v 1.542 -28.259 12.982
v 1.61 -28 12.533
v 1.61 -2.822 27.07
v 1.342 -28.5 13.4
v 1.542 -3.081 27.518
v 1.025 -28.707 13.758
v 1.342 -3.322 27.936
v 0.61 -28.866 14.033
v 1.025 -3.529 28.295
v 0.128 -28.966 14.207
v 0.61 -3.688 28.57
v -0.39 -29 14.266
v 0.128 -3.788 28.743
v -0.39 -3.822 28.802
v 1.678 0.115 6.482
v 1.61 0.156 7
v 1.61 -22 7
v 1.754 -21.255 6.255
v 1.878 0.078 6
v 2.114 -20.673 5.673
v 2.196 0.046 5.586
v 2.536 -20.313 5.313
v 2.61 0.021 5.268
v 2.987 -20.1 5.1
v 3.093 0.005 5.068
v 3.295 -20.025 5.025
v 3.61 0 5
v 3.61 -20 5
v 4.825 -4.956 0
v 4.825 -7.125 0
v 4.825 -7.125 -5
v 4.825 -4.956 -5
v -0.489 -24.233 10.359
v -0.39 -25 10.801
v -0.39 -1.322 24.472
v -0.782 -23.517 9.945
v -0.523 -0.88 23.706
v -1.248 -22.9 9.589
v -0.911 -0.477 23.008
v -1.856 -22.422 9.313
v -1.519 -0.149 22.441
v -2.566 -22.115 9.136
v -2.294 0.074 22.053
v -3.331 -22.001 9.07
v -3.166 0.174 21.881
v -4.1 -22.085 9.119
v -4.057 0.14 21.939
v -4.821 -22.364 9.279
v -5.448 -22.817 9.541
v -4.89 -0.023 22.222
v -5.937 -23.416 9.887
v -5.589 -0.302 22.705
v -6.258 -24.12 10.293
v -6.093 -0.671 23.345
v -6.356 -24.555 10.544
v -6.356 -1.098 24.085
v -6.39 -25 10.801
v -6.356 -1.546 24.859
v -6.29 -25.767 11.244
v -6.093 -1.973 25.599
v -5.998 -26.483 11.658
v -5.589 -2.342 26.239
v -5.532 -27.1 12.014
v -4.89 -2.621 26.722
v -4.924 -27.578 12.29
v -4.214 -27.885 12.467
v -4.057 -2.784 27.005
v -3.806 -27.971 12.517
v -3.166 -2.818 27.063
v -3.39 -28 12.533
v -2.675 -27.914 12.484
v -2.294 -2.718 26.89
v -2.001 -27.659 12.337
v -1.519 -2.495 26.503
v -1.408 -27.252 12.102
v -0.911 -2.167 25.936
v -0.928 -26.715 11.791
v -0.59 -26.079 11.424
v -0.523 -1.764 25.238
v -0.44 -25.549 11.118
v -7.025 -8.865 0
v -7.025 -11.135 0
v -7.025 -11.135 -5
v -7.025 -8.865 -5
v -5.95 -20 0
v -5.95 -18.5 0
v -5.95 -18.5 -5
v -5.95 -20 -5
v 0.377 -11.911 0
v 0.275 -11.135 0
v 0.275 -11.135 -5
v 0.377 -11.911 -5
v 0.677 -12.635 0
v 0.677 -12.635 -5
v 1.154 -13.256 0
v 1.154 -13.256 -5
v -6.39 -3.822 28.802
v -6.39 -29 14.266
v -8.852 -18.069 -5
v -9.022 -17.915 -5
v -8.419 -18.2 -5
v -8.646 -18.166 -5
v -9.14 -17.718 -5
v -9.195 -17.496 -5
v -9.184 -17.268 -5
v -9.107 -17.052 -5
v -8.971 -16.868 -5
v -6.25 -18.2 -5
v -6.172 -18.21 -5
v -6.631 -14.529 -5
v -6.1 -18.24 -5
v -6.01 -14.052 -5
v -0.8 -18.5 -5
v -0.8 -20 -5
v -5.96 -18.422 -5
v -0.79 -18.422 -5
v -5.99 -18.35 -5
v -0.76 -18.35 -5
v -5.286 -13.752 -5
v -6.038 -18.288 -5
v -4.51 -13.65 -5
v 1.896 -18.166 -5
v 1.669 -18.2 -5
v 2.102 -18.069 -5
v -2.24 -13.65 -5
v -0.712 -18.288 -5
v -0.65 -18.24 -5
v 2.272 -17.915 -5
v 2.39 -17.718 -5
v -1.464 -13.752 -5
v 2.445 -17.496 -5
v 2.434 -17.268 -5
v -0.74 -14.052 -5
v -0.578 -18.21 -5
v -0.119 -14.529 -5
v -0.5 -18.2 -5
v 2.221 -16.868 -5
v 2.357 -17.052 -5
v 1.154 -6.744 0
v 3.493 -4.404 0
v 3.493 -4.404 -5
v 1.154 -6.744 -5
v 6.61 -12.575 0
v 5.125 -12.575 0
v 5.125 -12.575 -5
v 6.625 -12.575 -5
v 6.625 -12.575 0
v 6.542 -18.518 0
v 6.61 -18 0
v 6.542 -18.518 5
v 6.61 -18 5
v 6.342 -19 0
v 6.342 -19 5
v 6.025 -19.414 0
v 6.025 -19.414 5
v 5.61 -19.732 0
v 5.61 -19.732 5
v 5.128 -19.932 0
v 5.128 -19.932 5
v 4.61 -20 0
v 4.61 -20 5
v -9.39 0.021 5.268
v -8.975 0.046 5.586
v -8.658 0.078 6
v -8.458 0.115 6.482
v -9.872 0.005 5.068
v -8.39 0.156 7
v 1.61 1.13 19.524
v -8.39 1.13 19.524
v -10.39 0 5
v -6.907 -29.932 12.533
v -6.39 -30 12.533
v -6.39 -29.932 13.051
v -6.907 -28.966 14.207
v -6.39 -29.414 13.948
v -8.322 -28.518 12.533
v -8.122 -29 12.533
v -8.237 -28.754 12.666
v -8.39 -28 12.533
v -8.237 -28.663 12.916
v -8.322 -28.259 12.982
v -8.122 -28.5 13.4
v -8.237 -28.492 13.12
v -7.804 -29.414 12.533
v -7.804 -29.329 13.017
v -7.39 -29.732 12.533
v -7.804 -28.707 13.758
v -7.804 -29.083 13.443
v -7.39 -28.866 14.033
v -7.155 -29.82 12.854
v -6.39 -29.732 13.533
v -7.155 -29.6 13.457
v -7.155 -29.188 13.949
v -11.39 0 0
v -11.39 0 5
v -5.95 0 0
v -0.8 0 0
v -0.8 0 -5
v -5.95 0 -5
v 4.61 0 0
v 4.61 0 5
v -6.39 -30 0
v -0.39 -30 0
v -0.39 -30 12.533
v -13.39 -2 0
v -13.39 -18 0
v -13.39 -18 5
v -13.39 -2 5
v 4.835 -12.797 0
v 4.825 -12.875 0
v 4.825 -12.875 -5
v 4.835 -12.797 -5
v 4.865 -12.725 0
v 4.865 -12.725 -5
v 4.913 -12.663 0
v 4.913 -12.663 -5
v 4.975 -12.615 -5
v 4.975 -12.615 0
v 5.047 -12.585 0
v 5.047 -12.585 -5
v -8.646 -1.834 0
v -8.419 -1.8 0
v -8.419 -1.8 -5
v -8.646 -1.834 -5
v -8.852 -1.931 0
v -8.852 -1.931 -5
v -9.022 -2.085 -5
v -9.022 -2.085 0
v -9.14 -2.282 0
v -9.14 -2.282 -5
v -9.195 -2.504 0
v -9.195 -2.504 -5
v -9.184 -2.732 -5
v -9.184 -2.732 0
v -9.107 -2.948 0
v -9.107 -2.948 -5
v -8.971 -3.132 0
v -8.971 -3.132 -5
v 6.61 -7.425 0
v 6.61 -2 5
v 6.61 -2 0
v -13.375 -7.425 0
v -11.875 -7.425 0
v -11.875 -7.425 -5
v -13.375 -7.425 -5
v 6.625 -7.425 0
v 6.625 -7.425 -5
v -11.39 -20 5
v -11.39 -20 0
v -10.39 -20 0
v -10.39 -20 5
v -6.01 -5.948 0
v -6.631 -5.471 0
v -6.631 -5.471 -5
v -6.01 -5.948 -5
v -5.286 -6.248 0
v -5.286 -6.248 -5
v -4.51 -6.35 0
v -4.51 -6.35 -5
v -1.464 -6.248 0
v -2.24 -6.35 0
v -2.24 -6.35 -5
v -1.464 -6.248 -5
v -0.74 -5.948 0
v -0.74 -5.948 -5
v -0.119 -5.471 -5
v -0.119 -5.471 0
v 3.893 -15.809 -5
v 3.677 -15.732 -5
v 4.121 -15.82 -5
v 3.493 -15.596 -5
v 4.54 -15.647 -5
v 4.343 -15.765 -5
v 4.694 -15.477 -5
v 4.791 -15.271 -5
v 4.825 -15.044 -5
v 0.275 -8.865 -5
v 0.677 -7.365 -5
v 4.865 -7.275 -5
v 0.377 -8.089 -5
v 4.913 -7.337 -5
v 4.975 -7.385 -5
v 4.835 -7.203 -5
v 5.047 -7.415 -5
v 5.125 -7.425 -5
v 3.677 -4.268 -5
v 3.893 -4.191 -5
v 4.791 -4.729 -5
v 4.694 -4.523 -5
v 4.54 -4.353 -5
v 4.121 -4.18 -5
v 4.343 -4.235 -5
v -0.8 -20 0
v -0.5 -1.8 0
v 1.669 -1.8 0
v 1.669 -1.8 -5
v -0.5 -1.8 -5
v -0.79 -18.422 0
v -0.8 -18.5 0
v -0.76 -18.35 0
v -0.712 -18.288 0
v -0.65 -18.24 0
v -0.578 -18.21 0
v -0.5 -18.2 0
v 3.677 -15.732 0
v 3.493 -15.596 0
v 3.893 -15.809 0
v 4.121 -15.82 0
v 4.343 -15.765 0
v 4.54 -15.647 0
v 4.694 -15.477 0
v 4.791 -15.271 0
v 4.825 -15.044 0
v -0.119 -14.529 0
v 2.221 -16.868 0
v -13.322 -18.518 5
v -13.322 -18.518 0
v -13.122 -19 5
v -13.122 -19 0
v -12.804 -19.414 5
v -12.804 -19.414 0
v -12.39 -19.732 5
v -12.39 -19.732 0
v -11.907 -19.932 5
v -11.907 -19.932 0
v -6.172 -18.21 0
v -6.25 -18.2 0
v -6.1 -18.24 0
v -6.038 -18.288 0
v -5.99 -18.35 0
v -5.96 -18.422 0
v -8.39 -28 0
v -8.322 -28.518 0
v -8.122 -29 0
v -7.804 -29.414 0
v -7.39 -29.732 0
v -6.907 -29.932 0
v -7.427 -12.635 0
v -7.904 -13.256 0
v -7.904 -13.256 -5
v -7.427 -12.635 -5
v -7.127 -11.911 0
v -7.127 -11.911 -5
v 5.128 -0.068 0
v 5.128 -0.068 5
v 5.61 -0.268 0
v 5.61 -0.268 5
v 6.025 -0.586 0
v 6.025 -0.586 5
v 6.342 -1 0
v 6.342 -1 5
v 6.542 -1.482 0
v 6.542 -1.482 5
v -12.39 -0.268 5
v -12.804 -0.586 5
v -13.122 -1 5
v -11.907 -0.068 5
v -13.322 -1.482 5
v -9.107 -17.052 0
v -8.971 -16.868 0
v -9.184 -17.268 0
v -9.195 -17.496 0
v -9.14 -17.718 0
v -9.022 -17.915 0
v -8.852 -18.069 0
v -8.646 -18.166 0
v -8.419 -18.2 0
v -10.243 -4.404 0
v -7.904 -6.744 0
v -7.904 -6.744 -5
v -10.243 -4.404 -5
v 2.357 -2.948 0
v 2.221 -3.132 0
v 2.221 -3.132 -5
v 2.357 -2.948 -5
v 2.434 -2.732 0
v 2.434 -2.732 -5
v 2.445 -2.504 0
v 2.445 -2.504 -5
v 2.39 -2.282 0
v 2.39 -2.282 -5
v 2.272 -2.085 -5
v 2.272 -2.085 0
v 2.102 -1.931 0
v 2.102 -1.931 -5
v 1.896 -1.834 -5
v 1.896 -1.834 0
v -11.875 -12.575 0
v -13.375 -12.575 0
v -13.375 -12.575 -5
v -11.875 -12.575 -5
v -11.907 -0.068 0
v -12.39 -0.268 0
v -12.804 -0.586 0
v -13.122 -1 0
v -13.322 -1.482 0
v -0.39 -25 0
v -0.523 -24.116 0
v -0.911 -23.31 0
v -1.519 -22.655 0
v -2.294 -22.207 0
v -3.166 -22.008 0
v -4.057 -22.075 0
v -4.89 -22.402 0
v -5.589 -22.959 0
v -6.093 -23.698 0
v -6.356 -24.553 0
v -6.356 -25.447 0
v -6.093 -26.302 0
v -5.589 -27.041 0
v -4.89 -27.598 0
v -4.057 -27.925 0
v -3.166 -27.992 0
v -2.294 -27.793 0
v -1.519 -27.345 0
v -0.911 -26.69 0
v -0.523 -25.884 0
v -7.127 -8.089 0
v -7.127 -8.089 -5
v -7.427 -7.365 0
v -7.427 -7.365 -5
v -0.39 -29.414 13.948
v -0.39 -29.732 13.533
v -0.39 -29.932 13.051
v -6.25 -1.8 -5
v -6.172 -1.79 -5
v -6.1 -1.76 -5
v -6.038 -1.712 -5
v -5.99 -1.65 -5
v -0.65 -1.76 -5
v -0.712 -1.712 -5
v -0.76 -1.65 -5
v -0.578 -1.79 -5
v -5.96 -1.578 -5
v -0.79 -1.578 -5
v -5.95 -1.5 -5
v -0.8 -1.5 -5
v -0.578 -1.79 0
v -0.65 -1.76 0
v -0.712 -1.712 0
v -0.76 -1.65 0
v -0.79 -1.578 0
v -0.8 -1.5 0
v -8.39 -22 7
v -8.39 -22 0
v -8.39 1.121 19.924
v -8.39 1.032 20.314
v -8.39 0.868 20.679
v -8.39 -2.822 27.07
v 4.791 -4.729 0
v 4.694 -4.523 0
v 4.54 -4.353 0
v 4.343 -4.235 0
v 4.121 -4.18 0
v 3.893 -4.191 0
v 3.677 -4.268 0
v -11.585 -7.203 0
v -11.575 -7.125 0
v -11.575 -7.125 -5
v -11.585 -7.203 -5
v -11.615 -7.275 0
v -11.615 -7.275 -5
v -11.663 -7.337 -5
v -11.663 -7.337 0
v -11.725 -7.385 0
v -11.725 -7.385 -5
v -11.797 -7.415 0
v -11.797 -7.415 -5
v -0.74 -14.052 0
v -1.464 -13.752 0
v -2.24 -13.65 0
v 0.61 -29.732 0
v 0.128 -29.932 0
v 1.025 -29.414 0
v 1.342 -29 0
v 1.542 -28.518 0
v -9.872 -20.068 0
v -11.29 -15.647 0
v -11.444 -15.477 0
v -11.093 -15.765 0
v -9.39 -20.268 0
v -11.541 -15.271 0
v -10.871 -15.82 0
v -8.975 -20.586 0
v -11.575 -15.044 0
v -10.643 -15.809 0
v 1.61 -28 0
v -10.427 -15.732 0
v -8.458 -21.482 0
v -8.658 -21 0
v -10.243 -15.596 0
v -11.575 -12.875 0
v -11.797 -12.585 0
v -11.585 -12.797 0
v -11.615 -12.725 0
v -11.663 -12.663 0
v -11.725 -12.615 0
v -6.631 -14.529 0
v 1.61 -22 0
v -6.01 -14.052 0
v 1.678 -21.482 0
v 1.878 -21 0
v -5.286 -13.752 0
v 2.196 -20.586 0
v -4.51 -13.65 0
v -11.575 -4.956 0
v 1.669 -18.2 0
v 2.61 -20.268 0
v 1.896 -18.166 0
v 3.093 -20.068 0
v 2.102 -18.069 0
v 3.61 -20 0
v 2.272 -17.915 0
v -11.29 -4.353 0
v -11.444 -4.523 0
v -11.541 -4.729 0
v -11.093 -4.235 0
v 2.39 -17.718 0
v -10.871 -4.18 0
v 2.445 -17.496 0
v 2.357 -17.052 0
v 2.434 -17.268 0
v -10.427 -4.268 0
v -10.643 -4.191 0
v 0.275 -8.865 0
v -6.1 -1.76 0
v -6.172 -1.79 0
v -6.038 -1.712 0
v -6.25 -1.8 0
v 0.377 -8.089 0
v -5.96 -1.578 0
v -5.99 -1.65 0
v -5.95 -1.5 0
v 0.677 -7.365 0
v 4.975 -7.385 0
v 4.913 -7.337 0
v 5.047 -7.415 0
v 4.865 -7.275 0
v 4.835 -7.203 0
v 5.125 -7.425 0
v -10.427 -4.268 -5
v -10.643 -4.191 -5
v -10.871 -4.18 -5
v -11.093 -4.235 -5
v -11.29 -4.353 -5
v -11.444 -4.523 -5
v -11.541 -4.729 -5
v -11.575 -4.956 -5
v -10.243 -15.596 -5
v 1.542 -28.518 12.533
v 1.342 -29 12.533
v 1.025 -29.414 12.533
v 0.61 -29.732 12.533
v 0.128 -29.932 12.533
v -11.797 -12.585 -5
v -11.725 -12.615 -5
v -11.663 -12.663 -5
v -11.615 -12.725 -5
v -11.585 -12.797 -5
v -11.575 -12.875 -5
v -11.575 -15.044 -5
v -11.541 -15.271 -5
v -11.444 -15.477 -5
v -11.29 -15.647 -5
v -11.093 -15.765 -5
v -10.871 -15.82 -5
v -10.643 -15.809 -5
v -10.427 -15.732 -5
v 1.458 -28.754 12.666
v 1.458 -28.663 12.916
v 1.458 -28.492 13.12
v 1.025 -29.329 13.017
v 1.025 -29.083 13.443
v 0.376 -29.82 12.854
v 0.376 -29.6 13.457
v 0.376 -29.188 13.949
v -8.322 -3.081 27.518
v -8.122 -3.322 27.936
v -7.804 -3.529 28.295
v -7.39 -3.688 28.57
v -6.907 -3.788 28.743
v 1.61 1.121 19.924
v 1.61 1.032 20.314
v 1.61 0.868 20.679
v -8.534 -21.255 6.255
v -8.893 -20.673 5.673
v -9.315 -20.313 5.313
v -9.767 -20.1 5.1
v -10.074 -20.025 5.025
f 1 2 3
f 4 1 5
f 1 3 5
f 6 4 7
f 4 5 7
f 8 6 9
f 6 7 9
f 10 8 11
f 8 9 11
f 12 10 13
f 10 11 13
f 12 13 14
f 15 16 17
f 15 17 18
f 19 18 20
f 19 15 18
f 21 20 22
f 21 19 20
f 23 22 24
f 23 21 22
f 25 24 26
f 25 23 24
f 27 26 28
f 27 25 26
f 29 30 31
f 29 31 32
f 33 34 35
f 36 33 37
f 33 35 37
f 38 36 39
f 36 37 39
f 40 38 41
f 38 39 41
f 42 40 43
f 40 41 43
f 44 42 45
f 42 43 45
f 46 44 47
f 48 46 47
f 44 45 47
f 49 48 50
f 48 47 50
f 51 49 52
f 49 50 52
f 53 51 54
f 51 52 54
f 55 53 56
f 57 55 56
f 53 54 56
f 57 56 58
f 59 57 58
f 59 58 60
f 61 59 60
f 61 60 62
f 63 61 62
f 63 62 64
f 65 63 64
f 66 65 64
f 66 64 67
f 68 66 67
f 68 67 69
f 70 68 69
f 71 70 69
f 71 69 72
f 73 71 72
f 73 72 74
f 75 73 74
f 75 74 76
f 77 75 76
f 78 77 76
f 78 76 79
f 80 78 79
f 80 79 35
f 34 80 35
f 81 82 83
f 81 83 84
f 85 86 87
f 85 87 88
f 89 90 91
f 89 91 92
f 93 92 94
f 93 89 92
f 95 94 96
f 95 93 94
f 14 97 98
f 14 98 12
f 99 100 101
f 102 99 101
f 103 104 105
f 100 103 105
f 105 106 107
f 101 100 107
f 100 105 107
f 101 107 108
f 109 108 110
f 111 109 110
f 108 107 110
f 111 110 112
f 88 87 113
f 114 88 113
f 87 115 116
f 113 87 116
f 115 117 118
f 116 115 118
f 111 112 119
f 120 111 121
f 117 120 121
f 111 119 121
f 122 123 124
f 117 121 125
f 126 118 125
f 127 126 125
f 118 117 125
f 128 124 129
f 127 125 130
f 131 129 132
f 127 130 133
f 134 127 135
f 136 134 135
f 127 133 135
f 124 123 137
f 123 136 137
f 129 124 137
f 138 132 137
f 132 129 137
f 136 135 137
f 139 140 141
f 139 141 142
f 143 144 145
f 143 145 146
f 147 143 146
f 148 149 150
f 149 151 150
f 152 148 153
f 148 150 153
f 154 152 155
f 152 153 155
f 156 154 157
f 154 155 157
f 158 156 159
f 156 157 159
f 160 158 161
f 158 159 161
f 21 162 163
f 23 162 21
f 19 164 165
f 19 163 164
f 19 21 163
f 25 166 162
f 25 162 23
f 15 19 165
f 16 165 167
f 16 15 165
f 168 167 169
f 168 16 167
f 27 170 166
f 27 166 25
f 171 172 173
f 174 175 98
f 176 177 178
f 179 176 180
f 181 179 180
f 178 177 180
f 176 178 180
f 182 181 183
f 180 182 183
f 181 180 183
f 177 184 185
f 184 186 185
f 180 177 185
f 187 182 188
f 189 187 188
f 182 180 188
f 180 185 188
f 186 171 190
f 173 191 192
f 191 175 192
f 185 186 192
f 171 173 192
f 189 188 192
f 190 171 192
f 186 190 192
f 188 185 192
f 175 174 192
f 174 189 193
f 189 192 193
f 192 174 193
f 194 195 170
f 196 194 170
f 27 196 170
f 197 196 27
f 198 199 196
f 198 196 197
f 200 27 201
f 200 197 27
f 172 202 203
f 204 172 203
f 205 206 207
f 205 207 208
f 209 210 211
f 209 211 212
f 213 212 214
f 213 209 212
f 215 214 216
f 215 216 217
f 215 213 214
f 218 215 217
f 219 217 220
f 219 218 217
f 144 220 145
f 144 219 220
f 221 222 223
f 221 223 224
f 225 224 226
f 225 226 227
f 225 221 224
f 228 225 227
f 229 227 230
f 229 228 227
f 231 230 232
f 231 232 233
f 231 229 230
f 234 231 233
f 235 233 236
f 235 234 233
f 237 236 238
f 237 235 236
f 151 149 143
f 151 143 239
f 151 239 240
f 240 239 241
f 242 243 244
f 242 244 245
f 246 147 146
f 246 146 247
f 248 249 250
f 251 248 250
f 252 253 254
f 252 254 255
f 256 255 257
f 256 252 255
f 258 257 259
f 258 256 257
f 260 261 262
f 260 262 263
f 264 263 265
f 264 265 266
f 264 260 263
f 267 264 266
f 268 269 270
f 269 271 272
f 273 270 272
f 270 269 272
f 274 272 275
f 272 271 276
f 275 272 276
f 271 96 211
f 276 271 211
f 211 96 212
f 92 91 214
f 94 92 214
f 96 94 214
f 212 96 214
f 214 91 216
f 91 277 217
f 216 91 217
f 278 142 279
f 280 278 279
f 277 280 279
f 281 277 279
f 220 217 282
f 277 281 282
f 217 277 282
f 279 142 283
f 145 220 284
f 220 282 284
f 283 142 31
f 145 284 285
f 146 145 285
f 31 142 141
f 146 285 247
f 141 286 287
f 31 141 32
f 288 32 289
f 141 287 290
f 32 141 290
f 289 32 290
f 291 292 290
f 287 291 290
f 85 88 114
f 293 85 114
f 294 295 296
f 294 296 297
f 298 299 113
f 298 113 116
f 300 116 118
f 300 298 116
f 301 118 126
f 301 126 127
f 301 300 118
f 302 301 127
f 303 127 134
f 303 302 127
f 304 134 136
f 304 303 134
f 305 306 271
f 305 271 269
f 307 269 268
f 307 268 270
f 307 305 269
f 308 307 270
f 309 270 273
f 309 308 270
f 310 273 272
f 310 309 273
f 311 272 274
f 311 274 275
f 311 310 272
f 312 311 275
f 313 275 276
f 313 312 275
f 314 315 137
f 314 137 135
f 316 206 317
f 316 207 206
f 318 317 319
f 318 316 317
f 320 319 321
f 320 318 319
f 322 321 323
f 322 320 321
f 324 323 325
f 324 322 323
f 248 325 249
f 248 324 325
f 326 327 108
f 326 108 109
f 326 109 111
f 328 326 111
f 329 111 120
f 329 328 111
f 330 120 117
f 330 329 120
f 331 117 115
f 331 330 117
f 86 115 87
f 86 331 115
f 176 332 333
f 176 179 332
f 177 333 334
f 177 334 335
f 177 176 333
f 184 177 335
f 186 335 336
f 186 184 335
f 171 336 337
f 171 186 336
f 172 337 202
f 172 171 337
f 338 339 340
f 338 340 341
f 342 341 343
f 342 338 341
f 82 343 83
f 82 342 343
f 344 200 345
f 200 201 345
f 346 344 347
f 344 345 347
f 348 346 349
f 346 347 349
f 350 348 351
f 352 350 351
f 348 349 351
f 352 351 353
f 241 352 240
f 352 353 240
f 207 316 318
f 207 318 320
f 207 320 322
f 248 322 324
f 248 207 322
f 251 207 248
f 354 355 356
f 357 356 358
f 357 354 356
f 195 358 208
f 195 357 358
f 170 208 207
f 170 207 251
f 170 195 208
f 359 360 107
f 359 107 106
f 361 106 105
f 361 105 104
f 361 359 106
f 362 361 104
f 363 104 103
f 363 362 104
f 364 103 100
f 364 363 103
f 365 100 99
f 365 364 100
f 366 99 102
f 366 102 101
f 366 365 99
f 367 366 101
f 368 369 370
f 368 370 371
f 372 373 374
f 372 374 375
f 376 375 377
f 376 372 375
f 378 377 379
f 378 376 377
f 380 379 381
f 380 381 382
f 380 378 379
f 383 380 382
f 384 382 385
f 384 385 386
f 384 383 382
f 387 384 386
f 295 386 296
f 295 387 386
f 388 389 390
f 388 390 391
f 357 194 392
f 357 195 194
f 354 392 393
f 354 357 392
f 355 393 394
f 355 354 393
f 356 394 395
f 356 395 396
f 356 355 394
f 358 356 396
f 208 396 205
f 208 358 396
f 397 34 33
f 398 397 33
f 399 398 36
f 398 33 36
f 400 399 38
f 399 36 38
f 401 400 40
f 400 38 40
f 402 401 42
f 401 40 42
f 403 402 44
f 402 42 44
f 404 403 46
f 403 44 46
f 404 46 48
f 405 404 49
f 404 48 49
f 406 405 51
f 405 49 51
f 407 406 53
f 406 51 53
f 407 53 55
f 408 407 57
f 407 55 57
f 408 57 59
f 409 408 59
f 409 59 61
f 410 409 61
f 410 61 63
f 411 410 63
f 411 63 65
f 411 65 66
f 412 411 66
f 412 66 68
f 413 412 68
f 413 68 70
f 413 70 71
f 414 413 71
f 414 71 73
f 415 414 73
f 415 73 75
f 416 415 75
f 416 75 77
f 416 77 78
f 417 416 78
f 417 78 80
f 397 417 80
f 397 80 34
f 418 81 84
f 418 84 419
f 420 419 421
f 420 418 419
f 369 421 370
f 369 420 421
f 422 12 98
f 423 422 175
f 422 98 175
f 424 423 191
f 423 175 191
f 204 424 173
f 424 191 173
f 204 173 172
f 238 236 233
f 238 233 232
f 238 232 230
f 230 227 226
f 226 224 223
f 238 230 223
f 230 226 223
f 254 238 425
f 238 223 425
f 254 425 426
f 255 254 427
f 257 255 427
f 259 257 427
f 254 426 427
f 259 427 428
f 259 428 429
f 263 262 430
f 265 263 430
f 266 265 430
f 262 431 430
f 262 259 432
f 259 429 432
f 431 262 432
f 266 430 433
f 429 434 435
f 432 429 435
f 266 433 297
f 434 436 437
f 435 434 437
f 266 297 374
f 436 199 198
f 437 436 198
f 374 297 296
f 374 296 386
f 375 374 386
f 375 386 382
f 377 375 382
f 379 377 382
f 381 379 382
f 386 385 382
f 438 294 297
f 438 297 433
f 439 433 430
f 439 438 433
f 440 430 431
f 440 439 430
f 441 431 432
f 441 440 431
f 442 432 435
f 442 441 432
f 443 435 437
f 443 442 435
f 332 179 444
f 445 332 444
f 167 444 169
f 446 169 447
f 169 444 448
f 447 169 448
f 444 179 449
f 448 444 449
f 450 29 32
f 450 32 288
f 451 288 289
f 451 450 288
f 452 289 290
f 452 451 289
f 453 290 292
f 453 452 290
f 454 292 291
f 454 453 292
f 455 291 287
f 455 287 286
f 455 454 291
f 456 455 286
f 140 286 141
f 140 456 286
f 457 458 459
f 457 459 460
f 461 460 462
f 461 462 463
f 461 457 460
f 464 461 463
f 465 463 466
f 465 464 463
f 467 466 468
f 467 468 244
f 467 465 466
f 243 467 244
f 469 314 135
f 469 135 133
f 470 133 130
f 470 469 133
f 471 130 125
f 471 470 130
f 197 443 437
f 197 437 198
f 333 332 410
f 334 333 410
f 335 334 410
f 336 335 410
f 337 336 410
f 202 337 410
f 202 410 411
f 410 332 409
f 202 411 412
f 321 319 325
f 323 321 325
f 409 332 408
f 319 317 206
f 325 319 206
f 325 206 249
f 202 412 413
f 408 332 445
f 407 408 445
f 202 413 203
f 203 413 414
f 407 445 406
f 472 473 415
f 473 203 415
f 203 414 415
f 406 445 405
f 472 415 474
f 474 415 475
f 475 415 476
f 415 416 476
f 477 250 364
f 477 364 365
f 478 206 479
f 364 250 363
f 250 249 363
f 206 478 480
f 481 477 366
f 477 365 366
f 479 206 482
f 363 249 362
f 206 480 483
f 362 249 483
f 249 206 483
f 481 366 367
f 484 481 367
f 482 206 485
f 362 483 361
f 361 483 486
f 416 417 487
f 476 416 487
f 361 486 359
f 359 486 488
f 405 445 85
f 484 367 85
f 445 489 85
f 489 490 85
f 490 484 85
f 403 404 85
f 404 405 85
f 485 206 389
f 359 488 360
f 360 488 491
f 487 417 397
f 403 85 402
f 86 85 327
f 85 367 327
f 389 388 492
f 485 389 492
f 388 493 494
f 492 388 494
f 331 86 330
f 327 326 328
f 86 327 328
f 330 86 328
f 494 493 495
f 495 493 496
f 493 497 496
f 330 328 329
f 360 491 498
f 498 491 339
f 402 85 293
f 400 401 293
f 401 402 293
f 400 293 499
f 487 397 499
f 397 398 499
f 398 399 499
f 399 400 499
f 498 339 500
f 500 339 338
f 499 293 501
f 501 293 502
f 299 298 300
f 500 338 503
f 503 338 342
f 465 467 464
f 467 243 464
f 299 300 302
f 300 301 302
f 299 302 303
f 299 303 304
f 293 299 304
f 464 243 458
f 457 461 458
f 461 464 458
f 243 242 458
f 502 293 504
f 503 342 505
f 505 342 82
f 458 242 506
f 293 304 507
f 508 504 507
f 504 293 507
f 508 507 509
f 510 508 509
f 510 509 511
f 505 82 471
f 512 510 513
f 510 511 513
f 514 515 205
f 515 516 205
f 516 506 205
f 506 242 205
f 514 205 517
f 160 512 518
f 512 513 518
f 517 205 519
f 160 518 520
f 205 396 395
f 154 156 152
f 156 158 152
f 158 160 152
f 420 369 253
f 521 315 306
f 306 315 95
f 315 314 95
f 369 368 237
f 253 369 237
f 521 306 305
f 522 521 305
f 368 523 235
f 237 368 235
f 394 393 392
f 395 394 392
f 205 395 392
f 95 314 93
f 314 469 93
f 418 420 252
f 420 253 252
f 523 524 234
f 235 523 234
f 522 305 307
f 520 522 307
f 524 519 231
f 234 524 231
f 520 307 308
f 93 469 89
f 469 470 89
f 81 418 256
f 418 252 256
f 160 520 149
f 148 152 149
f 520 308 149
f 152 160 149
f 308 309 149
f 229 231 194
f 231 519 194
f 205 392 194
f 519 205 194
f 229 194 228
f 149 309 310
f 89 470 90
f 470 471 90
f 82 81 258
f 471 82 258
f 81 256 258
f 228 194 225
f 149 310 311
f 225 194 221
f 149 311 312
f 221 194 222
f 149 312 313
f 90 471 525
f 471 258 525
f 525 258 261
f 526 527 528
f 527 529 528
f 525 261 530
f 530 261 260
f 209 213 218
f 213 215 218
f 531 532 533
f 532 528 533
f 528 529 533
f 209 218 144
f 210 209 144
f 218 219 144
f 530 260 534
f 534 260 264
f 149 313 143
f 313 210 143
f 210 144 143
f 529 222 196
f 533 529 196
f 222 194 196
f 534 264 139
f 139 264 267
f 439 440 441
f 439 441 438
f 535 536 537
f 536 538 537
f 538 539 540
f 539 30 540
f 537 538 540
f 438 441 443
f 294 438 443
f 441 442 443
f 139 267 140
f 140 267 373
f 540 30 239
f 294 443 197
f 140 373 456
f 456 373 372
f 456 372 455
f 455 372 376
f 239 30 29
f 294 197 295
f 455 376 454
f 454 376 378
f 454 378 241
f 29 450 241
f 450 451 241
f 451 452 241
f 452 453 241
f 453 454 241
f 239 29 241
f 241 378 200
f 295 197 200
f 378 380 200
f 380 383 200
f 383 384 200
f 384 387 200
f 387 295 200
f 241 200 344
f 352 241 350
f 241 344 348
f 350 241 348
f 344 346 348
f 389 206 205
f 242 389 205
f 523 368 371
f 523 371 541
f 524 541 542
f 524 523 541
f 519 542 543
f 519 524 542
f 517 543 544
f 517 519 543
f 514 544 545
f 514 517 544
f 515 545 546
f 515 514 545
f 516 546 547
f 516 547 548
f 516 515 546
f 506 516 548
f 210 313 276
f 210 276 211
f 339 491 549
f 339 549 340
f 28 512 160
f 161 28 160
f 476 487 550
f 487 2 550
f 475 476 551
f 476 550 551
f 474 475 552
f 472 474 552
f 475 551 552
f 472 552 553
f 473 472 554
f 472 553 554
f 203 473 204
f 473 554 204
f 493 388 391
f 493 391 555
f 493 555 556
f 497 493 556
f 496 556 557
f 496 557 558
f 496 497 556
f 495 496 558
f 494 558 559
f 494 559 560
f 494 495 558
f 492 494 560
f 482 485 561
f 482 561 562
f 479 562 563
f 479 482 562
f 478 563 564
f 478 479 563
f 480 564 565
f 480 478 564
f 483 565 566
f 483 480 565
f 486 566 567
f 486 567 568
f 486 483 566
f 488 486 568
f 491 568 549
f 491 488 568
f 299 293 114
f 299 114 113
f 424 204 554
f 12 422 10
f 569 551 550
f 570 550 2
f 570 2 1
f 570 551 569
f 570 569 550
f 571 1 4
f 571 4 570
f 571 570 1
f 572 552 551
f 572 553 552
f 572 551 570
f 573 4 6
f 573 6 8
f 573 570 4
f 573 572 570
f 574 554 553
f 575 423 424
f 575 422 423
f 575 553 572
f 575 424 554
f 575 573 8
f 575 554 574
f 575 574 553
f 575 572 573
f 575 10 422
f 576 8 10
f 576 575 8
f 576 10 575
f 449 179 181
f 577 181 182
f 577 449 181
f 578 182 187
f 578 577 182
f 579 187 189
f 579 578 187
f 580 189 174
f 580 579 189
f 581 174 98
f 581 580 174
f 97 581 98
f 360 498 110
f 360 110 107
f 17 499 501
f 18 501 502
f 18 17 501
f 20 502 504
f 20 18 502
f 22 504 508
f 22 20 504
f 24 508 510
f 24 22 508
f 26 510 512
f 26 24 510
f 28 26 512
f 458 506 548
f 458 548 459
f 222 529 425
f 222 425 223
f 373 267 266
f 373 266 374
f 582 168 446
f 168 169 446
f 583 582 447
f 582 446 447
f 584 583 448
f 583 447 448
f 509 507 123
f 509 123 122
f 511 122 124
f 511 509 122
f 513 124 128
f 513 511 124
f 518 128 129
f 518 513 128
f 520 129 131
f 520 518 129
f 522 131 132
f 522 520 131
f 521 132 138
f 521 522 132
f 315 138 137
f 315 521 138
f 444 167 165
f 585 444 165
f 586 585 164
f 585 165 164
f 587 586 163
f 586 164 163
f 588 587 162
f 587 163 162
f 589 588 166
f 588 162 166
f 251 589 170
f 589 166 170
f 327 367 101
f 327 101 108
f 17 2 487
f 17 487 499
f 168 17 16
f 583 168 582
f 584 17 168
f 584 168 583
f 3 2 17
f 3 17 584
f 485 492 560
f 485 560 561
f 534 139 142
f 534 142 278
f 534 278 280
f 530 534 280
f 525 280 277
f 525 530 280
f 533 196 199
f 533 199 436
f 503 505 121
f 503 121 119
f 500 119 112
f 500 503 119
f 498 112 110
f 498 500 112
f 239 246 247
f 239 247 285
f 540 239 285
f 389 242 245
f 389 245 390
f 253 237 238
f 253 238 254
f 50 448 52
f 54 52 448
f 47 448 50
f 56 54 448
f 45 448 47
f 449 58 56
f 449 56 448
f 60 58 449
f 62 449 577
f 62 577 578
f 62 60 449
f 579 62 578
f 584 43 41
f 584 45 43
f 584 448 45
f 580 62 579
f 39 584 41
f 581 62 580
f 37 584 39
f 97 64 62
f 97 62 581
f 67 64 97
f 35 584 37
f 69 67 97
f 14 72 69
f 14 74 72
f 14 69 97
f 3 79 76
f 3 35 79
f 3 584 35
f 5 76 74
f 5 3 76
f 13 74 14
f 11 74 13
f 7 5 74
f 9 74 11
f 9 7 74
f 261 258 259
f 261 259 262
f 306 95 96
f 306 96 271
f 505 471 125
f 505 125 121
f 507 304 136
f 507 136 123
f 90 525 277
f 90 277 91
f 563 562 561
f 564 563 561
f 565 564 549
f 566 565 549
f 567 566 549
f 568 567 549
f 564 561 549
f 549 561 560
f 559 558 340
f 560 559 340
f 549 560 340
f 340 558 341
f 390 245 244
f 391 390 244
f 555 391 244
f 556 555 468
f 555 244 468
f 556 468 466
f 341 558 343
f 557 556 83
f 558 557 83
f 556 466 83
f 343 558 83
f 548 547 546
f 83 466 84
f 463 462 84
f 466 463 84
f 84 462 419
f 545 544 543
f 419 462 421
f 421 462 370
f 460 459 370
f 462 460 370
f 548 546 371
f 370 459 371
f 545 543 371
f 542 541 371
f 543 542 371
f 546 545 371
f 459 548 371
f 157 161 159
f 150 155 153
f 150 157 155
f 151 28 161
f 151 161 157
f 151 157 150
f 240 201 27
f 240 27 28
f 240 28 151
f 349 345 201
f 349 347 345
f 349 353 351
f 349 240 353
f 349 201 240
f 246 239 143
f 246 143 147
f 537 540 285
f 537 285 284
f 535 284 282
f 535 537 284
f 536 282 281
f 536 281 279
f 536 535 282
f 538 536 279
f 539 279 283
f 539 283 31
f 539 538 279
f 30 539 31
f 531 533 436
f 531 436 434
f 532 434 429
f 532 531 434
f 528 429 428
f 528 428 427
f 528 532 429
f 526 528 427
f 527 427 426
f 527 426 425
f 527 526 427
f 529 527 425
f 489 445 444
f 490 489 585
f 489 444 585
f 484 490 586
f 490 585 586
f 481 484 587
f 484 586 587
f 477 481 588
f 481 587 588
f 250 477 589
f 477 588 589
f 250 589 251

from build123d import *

# Parameters (mm, degrees)
F1_DEPTH = 5
F2_W     = 20
F2_H     = 20
F3_DEPTH = 5
F6_W     = 10
F6_H     = 10
F6_R     = 3
F9_DEPTH = 10
F10_R    = 2


with BuildPart() as f1:
    # F0 (on Top) → F1 (new body)
    with BuildSketch(Plane.XY):
        with BuildLine():
            Line((-11.8750007629, -7.425), (-12.575, -7.425))
            Line((-12.575, -7.425), (-13.375, -7.425))
            Line((-13.375, -7.425), (-13.375, -12.575))
            Line((-13.375, -12.575), (-12.575, -12.575))
            Line((-12.575, -12.575), (-11.8750007629, -12.575))
            ThreePointArc((-11.8750007629, -12.575), (-11.6628687671, -12.6628679271), (-11.5750007629, -12.8749998911))
            Line((-11.5750007629, -12.8749998911), (-11.5749999754, -15.0441214738))
            ThreePointArc((-11.5749999754, -15.0441214738), (-11.0934929218, -15.7647472802), (-10.2434566861, -15.5956644799))
            Line((-10.2434566861, -15.5956644799), (-7.9036796566, -13.2558874505))
            ThreePointArc((-7.9036796566, -13.2558874505), (-7.2533614014, -12.2826174011), (-7.0250000001, -11.1345671007))
            Line((-7.0250000001, -11.1345671007), (-7.0250000049, -8.8654328821))
            ThreePointArc((-7.0250000049, -8.8654328821), (-7.2533614085, -7.7173825884), (-7.9036796613, -6.7441125448))
            Line((-7.9036796613, -6.7441125448), (-10.2434566921, -4.404335514))
            ThreePointArc((-10.2434566921, -4.404335514), (-11.0934929289, -4.2352527142), (-11.5749999814, -4.9558785223))
            Line((-11.5749999814, -4.9558785223), (-11.5750007629, -7.1250001081))
            ThreePointArc((-11.5750007629, -7.1250001081), (-11.6628687668, -7.3371320726), (-11.8750007629, -7.425))
        make_face()
    extrude(amount=-F1_DEPTH)



with BuildPart() as f1b:
    # F0 (on Top) → F1, piece 2 (new body)
    with BuildSketch(Plane.XY):
        with BuildLine():
            Line((-0.8, -20), (-0.8, -19.2))
            Line((-0.8, -19.2), (-0.8, -18.5000007629))
            ThreePointArc((-0.8, -18.5000007629), (-0.7121320729, -18.2878687671), (-0.5000001089, -18.2000007629))
            Line((-0.5000001089, -18.2000007629), (1.6691214738, -18.1999999754))
            ThreePointArc((1.6691214738, -18.1999999754), (2.3897472802, -17.7184929218), (2.2206644799, -16.868456686))
            Line((2.2206644799, -16.868456686), (-0.1191125495, -14.5286796566))
            ThreePointArc((-0.1191125495, -14.5286796566), (-1.0923825989, -13.8783614014), (-2.2404328993, -13.6500000001))
            Line((-2.2404328993, -13.6500000001), (-4.5095671179, -13.6500000049))
            ThreePointArc((-4.5095671179, -13.6500000049), (-5.6576174116, -13.8783614085), (-6.6308874552, -14.5286796613))
            Line((-6.6308874552, -14.5286796613), (-8.970664486, -16.8684566921))
            ThreePointArc((-8.970664486, -16.8684566921), (-9.1397472858, -17.7184929288), (-8.4191214777, -18.1999999814))
            Line((-8.4191214777, -18.1999999814), (-6.2499998919, -18.2000007629))
            ThreePointArc((-6.2499998919, -18.2000007629), (-6.0378679274, -18.2878687668), (-5.95, -18.5000007629))
            Line((-5.95, -18.5000007629), (-5.95, -19.2))
            Line((-5.95, -19.2), (-5.95, -20))
            Line((-5.95, -20), (-0.8, -20))
        make_face()
    extrude(amount=-F1_DEPTH)


with BuildPart() as f1c:
    # F0 (on Top) → F1, piece 3 (new body)
    with BuildSketch(Plane.XY):
        with BuildLine():
            Line((3.4934566861, -4.4043355201), (1.1536796566, -6.7441125495))
            ThreePointArc((1.1536796566, -6.7441125495), (0.5033614014, -7.7173825989), (0.2750000001, -8.8654328993))
            Line((0.2750000001, -8.8654328993), (0.2750000049, -11.1345671179))
            ThreePointArc((0.2750000049, -11.1345671179), (0.5033614085, -12.2826174116), (1.1536796613, -13.2558874552))
            Line((1.1536796613, -13.2558874552), (3.4934566921, -15.595664486))
            ThreePointArc((3.4934566921, -15.595664486), (4.3434929289, -15.7647472858), (4.8249999814, -15.0441214777))
            Line((4.8249999814, -15.0441214777), (4.8250007629, -12.8749998919))
            ThreePointArc((4.8250007629, -12.8749998919), (4.9128687668, -12.6628679274), (5.1250007629, -12.575))
            Line((5.1250007629, -12.575), (5.825, -12.575))
            Line((5.825, -12.575), (6.625, -12.575))
            Line((6.625, -12.575), (6.625, -7.425))
            Line((6.625, -7.425), (5.825, -7.425))
            Line((5.825, -7.425), (5.1250007629, -7.425))
            ThreePointArc((5.1250007629, -7.425), (4.9128687671, -7.3371320729), (4.8250007629, -7.1250001089))
            Line((4.8250007629, -7.1250001089), (4.8249999754, -4.9558785262))
            ThreePointArc((4.8249999754, -4.9558785262), (4.3434929218, -4.2352527198), (3.4934566861, -4.4043355201))
        make_face()
    extrude(amount=-F1_DEPTH)


with BuildPart() as f1d:
    # F0 (on Top) → F1, piece 4 (new body)
    with BuildSketch(Plane.XY):
        with BuildLine():
            Line((-0.8, -1.4999992371), (-0.8, -0.8))
            Line((-0.8, -0.8), (-0.8, 0))
            Line((-0.8, 0), (-5.95, 0))
            Line((-5.95, 0), (-5.95, -0.8))
            Line((-5.95, -0.8), (-5.95, -1.4999992371))
            ThreePointArc((-5.95, -1.4999992371), (-6.0378679271, -1.7121312329), (-6.2499998911, -1.7999992371))
            Line((-6.2499998911, -1.7999992371), (-8.4191214738, -1.8000000246))
            ThreePointArc((-8.4191214738, -1.8000000246), (-9.1397472801, -2.2815070782), (-8.9706644799, -3.1315433139))
            Line((-8.9706644799, -3.1315433139), (-6.6308874505, -5.4713203434))
            ThreePointArc((-6.6308874505, -5.4713203434), (-5.6576174011, -6.1216385986), (-4.5095671007, -6.3499999999))
            Line((-4.5095671007, -6.3499999999), (-2.2404328821, -6.3499999951))
            ThreePointArc((-2.2404328821, -6.3499999951), (-1.0923825884, -6.1216385915), (-0.1191125448, -5.4713203387))
            Line((-0.1191125448, -5.4713203387), (2.220664486, -3.1315433079))
            ThreePointArc((2.220664486, -3.1315433079), (2.3897472858, -2.2815070711), (1.6691214777, -1.8000000186))
            Line((1.6691214777, -1.8000000186), (-0.5000001081, -1.7999992371))
            ThreePointArc((-0.5000001081, -1.7999992371), (-0.7121320726, -1.7121312332), (-0.8, -1.4999992371))
        make_face()
    extrude(amount=-F1_DEPTH)


with BuildPart() as f1_1:
    add(f1.part)

    add(f1b.part)  # F3 merges F1b

    add(f1c.part)  # F3 merges F1c

    add(f1d.part)  # F3 merges F1d
    # F2 (on face) → F3 (join)
    with BuildSketch(Plane.XY):
        with Locations((-3.3896967843, -10)):
            Rectangle(F2_W, F2_H)
    extrude(amount=F3_DEPTH)

    # F7: sweep along a path in F5
    with BuildLine(Plane.YZ.offset(-3.3896967843)) as f7_path:
        Line((-25, 0), (-25, 10.8014274722))
        Line((-25, 10.8014274722), (-1.3219409988, 24.4719612104))
    # F6 (on Top) → F7 (sweep)
    with BuildSketch(Plane.XY):
        with Locations((-3.3896967843, -25)):
            Rectangle(F6_W, F6_H)
        with Locations((-3.3896967843, -25)):
            Circle(F6_R, mode=Mode.SUBTRACT)
    sweep(path=f7_path.line, transition=Transition.RIGHT)

    # F8 (on face) → F9 (join)
    with BuildSketch(Plane.YZ.offset(1.6103032157)):
        Polygon((0, 5), (1.1780590012, 20.1418341915), (-20, 7.9146761262), (-20, 5), align=None)
    extrude(amount=-F9_DEPTH)

    # F10
    f10_edges = [f1_1.edges().sort_by_distance(p)[0] for p in [
        (6.610303, 0, 2.5),
        (6.610303, -20, 2.5),
        (-13.389697, 0, 2.5),
        (-13.389697, -20, 2.5),
        (-8.389697, -30, 6.844089),
        (1.610303, -30, 6.844089),
        (-8.389697, -16.91097, 21.245134),
        (1.610303, -16.91097, 21.245134),
        (-3.389697, -30, 13.688179),
        (-8.389697, -20, 2.5),
        (1.610303, -20, 2.5),
        (1.610303, -10, 5),
        (-8.389697, -10, 5),
        (-3.389697, 1.178059, 20.141834),
    ]]
    fillet(f10_edges, radius=F10_R)


solid = f1_1.part
